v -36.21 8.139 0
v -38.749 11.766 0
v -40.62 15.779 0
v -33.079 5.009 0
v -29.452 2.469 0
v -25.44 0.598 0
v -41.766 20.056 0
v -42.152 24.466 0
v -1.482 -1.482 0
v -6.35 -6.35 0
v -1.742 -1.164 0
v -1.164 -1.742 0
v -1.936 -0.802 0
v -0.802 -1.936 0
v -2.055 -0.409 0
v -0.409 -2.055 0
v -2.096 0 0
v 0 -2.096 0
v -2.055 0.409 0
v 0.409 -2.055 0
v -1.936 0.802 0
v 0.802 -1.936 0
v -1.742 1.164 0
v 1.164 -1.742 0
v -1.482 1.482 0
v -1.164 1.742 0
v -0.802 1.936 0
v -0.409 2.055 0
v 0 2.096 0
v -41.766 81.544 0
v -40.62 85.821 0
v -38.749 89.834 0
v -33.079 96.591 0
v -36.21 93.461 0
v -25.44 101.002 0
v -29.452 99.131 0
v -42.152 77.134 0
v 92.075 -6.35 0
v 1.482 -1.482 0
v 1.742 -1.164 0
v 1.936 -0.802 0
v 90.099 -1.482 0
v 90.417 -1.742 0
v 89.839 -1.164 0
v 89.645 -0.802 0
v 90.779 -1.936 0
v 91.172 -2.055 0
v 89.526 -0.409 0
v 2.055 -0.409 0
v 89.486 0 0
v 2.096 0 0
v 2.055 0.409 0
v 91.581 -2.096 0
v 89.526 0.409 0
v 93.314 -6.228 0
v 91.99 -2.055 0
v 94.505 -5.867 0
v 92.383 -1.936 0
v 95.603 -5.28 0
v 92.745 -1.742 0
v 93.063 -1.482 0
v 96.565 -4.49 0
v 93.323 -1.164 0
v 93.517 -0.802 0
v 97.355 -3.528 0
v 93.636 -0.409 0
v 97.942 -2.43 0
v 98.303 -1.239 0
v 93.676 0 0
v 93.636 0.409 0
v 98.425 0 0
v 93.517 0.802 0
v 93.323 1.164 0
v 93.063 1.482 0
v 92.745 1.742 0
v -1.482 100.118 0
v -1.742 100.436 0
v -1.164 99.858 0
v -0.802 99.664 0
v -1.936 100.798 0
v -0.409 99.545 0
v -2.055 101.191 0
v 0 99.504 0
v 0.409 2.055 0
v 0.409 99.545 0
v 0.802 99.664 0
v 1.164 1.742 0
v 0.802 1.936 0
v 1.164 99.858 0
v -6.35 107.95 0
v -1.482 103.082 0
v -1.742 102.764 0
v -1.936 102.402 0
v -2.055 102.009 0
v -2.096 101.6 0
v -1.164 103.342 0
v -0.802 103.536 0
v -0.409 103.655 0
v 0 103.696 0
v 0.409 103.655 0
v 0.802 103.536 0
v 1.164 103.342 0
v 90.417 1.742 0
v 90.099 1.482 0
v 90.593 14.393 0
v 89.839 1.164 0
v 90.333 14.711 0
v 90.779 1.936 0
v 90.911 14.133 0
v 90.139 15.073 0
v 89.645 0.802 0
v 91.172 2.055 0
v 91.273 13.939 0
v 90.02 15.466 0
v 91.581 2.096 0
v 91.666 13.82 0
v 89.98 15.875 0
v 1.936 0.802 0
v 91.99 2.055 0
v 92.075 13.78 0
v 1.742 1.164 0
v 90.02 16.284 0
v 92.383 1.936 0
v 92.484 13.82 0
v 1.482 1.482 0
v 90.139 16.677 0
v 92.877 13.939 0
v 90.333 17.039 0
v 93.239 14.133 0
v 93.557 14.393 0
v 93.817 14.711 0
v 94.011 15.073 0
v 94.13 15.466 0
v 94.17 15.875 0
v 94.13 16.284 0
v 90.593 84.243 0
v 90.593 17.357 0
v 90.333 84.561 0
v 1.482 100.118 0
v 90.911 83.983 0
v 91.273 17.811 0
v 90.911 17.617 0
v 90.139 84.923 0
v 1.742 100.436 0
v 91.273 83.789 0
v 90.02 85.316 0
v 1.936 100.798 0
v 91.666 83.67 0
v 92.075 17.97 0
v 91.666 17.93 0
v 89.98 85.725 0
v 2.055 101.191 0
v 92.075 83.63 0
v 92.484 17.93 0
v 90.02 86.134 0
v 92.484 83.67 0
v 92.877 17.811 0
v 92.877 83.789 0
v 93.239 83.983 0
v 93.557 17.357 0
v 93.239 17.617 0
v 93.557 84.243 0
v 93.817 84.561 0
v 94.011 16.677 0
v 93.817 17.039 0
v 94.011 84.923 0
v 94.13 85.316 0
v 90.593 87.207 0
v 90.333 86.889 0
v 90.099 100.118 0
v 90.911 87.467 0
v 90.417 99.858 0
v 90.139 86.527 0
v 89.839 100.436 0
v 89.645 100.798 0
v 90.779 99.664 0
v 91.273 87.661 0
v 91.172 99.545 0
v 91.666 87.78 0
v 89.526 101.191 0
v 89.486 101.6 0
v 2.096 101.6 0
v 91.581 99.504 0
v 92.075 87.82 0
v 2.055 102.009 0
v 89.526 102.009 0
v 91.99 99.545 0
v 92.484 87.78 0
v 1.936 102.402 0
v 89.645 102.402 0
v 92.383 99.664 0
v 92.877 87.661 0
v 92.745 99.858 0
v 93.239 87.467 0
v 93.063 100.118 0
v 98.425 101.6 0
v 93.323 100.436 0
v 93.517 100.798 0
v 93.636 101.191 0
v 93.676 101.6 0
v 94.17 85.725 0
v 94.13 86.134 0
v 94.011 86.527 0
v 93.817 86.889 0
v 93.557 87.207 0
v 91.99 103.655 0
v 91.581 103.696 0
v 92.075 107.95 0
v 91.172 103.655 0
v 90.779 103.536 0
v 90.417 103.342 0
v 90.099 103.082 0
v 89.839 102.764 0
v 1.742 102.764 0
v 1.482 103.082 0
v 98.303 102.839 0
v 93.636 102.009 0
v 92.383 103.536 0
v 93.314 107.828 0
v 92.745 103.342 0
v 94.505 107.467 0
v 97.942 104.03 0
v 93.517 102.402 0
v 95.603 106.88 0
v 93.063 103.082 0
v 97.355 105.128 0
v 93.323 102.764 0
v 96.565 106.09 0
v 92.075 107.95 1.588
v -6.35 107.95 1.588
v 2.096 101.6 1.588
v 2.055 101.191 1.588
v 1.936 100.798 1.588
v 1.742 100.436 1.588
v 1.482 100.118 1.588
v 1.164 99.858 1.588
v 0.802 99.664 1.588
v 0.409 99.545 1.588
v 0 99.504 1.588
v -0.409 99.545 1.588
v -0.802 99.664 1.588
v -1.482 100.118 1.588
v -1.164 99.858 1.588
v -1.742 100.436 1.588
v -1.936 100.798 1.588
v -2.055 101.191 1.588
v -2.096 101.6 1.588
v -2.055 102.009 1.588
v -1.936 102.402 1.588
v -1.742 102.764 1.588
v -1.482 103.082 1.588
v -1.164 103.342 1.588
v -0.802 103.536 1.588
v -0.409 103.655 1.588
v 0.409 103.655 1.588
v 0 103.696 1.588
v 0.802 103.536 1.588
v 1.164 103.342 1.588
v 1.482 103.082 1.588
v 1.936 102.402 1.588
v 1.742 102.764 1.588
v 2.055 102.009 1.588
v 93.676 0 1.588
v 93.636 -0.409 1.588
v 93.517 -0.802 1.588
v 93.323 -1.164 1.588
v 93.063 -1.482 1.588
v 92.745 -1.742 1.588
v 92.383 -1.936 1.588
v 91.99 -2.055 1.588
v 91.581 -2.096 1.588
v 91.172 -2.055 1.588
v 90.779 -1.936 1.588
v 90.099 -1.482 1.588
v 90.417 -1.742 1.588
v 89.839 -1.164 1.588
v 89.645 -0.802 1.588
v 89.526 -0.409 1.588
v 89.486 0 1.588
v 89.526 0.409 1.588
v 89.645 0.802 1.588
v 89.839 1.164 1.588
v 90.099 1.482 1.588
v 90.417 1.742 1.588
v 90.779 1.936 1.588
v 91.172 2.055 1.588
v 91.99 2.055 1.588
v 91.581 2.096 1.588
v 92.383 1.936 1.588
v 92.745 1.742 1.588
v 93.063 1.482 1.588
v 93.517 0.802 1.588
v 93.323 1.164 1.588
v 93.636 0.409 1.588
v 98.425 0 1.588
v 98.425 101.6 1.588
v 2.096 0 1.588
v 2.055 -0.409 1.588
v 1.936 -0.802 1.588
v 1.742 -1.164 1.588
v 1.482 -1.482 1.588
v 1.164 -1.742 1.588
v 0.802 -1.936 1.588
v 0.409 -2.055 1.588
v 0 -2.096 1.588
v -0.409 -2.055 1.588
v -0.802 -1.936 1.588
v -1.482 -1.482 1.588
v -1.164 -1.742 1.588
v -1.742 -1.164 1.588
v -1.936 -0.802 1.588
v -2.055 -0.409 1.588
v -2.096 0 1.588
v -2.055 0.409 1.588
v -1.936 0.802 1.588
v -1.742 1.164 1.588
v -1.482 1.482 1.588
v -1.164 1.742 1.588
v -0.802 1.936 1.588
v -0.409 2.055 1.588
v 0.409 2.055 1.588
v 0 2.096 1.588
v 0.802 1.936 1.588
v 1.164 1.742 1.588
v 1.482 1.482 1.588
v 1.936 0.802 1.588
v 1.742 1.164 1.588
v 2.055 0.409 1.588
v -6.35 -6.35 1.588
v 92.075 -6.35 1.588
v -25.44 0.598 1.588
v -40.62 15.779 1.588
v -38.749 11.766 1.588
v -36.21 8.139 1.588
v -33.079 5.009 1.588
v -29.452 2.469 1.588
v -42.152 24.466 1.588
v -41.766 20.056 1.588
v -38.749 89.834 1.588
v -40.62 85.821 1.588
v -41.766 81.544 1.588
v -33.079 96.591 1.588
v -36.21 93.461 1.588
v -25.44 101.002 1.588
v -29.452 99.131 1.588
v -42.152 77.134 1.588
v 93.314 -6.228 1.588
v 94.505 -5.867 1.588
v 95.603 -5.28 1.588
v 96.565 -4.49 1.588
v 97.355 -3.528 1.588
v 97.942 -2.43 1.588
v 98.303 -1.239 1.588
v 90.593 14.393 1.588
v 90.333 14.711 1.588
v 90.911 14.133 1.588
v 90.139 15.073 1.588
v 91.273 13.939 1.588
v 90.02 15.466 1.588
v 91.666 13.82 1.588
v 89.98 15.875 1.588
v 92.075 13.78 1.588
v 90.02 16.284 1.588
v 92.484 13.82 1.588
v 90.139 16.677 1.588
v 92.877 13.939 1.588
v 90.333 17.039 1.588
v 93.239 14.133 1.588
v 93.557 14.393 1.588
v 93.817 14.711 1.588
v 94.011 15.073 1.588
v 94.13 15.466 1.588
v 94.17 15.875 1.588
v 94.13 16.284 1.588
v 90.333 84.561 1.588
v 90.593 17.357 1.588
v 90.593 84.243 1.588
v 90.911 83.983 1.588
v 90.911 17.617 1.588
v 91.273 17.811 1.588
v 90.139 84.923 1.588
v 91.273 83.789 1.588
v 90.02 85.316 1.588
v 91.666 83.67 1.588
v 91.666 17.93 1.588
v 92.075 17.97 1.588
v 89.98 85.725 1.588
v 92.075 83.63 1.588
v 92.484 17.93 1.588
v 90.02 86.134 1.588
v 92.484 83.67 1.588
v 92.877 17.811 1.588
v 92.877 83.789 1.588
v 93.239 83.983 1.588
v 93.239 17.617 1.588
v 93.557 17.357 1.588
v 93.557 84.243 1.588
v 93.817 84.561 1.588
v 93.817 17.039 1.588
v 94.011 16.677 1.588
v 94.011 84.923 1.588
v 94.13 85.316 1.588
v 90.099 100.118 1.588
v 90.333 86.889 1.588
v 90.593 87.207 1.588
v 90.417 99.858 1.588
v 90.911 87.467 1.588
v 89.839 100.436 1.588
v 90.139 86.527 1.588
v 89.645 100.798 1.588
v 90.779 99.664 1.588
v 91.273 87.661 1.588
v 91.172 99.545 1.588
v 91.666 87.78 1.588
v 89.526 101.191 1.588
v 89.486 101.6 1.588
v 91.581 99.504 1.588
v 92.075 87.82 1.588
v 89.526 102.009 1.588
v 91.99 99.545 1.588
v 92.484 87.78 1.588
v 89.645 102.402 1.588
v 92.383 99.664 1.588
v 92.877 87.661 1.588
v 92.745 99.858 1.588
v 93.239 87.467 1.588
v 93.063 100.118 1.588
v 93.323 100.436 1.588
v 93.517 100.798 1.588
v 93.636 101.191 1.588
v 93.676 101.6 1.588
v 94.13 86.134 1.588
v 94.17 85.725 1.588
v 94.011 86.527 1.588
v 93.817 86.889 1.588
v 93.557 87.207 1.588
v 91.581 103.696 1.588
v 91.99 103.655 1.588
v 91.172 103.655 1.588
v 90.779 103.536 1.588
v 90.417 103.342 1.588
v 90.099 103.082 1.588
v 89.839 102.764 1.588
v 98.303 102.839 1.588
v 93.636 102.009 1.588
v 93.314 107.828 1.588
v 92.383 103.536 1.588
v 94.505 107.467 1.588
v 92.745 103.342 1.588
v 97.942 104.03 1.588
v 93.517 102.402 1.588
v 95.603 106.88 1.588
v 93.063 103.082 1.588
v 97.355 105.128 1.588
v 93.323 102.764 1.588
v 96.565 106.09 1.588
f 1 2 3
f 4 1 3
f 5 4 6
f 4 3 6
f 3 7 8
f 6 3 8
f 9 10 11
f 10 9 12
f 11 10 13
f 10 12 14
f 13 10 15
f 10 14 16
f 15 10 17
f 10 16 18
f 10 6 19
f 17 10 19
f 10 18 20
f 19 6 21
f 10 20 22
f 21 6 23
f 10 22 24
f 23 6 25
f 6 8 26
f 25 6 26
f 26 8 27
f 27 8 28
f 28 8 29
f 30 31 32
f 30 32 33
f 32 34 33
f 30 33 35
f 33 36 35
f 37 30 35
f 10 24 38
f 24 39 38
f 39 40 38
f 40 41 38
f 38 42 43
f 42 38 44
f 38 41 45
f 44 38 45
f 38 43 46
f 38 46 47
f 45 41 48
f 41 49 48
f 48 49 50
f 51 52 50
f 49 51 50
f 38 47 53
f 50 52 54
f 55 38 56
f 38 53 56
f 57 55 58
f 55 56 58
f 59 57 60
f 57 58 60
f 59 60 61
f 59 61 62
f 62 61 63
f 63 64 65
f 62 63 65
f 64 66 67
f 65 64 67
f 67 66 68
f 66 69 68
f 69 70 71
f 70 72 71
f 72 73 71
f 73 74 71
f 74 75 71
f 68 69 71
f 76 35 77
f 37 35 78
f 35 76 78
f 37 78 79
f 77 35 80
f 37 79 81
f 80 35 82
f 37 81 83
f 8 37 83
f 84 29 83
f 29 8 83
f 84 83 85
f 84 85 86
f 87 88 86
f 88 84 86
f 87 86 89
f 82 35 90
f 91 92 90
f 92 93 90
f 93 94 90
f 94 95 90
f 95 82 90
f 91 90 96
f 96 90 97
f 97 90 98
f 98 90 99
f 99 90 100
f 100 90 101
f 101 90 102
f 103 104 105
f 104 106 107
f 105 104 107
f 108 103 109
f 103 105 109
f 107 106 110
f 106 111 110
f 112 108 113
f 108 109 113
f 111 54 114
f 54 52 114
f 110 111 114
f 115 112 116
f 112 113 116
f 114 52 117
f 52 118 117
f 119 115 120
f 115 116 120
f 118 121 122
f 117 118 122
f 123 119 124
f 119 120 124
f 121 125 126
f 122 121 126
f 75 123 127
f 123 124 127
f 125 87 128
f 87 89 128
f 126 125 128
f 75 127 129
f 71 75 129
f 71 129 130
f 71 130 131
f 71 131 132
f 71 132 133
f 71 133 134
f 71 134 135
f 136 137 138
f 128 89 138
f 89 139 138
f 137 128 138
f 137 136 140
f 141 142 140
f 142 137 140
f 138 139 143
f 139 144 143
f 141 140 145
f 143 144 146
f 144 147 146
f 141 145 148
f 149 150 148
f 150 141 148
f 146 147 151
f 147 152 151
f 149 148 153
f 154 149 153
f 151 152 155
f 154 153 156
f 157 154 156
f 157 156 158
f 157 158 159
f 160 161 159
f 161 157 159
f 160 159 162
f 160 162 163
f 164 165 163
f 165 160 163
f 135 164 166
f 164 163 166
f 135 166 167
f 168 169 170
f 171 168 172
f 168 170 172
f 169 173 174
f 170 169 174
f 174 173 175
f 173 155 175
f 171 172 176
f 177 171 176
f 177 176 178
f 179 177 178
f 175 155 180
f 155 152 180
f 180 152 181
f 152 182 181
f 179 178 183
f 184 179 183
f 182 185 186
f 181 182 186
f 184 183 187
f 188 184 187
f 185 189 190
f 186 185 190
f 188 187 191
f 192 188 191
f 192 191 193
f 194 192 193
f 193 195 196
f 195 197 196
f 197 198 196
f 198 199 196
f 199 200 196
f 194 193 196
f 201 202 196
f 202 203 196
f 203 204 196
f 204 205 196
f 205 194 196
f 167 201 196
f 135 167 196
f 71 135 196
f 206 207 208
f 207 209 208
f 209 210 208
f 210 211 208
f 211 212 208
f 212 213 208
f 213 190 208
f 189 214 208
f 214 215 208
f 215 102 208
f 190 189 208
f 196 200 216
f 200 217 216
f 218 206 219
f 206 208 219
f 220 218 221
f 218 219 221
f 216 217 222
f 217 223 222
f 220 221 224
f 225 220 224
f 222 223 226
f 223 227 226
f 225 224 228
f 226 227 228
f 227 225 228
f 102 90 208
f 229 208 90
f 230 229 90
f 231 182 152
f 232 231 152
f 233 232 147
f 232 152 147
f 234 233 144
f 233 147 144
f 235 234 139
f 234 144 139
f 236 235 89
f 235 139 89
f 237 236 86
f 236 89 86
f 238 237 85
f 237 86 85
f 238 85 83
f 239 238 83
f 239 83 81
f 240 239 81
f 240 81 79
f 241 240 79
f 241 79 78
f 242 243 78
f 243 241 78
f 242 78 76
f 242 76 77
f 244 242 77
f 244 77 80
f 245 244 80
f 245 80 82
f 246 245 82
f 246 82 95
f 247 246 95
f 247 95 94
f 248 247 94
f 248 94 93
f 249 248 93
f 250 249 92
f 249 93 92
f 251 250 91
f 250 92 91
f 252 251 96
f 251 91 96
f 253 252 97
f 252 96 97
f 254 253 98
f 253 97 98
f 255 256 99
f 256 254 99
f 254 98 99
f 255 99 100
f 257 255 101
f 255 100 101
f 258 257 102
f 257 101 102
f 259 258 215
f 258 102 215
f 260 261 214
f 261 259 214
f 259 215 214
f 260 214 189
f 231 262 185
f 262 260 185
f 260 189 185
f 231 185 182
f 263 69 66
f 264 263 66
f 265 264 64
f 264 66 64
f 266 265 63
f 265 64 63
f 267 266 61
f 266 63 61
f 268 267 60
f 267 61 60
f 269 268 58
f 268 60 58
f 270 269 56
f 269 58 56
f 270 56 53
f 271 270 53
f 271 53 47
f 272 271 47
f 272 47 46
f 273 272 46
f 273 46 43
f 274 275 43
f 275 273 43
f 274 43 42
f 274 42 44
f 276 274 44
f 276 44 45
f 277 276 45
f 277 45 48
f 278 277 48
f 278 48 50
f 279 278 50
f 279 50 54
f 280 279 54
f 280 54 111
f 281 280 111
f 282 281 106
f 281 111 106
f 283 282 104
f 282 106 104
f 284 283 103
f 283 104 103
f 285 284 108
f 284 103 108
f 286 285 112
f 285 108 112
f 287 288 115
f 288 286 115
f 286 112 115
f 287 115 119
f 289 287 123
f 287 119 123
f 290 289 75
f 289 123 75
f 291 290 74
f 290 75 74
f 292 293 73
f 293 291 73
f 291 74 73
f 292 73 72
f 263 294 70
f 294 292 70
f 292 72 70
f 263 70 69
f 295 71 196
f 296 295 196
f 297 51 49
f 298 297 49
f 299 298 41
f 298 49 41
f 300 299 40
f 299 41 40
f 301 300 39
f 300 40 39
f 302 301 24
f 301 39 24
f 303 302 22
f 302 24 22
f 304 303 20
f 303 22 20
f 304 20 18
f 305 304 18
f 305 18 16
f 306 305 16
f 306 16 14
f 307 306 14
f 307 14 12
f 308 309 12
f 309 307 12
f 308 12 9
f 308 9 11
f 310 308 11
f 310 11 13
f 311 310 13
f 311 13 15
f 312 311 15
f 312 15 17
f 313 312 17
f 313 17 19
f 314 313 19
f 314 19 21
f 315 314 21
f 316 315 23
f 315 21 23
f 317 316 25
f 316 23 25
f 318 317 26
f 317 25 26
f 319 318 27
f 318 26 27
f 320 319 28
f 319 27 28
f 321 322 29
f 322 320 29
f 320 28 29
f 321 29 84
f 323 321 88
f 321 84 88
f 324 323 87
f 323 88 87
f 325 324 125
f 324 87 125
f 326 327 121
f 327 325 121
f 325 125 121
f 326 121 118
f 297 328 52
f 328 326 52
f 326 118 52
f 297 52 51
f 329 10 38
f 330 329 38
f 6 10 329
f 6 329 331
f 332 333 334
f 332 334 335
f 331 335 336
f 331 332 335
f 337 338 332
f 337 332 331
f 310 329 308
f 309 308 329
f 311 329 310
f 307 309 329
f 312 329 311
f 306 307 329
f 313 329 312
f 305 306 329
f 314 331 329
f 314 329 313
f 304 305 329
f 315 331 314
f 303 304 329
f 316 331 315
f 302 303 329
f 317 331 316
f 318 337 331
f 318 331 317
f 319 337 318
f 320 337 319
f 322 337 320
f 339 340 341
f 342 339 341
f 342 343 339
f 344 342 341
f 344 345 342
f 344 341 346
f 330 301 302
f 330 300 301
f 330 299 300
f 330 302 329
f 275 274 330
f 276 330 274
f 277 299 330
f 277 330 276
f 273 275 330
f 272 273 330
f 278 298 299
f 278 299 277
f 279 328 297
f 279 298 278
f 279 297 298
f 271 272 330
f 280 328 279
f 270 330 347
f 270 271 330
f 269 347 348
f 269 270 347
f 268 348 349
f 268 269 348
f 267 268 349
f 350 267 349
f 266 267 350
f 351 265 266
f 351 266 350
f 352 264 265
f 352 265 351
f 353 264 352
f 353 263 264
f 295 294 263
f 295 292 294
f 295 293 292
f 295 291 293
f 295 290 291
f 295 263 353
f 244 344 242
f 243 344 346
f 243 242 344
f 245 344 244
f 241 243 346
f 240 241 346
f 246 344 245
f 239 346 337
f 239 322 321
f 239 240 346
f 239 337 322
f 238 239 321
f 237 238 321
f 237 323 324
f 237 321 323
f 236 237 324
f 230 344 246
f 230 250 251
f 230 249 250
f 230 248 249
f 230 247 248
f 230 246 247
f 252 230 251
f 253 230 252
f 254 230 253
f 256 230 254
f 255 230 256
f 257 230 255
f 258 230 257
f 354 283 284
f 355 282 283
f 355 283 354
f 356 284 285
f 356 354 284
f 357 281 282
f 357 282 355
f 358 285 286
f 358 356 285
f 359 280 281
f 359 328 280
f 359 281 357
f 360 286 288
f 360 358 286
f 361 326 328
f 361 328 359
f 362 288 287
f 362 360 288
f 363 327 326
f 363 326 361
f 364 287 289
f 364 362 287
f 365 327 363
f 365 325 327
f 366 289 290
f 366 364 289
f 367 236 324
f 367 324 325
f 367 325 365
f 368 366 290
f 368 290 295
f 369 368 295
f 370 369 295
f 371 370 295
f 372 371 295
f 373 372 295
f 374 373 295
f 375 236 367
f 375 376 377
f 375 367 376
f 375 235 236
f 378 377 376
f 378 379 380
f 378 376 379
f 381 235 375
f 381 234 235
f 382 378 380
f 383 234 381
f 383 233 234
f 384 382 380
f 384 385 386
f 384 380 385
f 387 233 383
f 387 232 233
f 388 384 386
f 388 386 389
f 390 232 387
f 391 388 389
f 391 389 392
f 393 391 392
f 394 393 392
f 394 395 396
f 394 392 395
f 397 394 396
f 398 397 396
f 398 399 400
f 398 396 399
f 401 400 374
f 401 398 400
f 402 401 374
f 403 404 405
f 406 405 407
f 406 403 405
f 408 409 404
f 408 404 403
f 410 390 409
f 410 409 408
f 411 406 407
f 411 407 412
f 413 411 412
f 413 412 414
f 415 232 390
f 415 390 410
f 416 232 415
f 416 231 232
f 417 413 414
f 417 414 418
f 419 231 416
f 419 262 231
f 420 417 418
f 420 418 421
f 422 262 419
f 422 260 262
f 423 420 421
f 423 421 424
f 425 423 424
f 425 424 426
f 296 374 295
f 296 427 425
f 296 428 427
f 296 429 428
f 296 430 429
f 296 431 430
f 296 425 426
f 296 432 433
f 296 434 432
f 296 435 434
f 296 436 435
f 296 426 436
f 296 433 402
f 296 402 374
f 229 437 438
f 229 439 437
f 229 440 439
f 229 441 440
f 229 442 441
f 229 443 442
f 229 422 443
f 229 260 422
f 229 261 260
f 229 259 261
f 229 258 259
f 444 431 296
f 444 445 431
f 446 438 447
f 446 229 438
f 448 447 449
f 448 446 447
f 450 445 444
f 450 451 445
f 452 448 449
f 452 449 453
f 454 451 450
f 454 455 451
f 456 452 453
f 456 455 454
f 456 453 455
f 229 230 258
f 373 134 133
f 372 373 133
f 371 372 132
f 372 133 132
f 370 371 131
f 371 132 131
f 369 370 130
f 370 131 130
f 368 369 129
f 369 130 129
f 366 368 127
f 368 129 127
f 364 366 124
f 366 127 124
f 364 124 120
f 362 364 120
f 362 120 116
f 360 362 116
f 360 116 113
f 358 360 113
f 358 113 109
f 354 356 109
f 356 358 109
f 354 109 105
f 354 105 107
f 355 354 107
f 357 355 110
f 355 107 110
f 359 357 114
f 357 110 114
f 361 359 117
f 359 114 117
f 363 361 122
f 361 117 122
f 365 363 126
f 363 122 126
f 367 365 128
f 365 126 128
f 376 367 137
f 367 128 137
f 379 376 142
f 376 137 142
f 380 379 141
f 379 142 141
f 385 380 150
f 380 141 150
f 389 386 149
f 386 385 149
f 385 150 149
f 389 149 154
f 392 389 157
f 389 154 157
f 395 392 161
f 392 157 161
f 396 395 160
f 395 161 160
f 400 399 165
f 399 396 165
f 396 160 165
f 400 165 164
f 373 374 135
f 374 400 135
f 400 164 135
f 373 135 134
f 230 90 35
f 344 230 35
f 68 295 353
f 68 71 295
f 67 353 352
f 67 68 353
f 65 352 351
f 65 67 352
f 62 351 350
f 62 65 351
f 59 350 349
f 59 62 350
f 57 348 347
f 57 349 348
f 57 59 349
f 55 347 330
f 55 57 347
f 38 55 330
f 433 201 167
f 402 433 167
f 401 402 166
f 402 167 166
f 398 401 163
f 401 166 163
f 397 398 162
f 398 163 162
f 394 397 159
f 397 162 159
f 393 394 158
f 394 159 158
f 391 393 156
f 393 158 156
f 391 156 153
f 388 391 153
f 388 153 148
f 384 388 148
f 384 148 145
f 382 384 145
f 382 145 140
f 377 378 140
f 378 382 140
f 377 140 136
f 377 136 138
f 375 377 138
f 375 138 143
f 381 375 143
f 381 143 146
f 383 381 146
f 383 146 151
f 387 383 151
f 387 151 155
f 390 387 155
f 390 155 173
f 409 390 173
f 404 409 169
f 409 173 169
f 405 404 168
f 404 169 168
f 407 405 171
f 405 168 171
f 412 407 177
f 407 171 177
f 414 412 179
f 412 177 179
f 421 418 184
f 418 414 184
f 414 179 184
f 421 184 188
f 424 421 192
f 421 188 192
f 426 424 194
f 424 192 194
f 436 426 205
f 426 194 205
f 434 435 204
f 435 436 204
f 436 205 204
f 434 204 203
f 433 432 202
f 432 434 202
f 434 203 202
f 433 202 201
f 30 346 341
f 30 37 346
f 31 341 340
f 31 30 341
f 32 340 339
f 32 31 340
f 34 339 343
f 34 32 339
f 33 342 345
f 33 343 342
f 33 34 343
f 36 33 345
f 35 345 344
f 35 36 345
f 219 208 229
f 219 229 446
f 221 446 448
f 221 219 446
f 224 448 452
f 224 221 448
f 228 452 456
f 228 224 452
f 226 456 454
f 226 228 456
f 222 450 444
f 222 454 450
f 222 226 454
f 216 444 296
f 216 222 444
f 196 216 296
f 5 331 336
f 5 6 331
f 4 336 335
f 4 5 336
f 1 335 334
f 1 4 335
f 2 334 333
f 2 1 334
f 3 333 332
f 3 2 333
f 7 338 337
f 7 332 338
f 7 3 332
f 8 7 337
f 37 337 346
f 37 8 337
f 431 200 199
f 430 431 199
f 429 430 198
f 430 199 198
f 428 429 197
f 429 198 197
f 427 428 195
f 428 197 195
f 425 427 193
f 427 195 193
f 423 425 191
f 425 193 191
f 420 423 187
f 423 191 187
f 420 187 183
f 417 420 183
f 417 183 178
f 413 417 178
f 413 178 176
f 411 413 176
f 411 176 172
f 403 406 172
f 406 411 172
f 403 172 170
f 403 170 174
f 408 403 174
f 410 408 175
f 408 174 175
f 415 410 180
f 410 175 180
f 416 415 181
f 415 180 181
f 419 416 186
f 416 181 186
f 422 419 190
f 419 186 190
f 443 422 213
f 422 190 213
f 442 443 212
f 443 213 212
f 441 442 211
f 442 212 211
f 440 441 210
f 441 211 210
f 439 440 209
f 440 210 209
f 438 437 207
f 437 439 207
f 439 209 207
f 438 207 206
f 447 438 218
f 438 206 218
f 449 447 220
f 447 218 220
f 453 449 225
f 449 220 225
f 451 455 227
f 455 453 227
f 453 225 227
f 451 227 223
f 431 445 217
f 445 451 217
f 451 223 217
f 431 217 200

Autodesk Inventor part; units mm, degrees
ref_plane "YZ Plane" through (0, 0, 0) normal (1, 0, 0) x (0, 1, 0)
ref_plane "XZ Plane" through (0, 0, 0) normal (0, 1, 0) x (-1, 0, 0)
ref_plane "XY Plane" through (0, 0, 0) normal (0, 0, 1) x (1, 0, 0)
sketch "Sketch1" plane through (0, 0, 0) normal (0, 0, 1) x (1, 0, 0)
  circle A0 centre (0, 0) radius 2.0955
  circle A1 centre (91.581, 0) radius 2.0955
  circle A2 centre (0, 101.6) radius 2.0955
  circle A3 centre (91.581, 101.6) radius 2.0955
  line L0 (-6.35, -6.35) -> (92.075, -6.35)
  line L1 (98.425, 0) -> (98.425, 101.6)
  line L2 (92.075, 107.95) -> (-6.35, 107.95)
  line L3 (-6.35, 107.95) -> (-25.4396, 101.002)
  line L4 (-6.35, -6.35) -> (-25.4396, 0.598)
  line L5 (-6.35, -6.35) -> (13.9647, -6.35) construction
  line L6 (-42.1523, 24.4662) -> (-42.1523, 77.1338)
  arc A4 (-25.4396, 101.002) -> (-42.1523, 77.1338) centre (-16.7523, 77.1338) ccw
  arc A5 (-42.1523, 24.4662) -> (-25.4396, 0.598) centre (-16.7523, 24.4662) ccw
  arc A6 (98.425, 101.6) -> (92.075, 107.95) centre (92.075, 101.6) ccw
  arc A7 (92.075, -6.35) -> (98.425, 0) centre (92.075, 0) ccw
  circle A8 centre (92.075, 85.725) radius 2.0955
  circle A9 centre (92.075, 15.875) radius 2.0955
  point P0 (98.425, -6.35)
  point P1 (98.425, 107.95)
  point P2 (-42.1523, 94.919)
  point P3 (-42.1523, 6.681)
  dimension "d0" = 4.191
  dimension "d1" = 4.191
  dimension "d2" = 4.191
  dimension "d3" = 4.191
  dimension "d4" = 104.775
  dimension "d5" = 114.3
  dimension "d6" = 38.1
  dimension "d7" = 160
  dimension "d8" = 38.1
  dimension "d9" = 160
  dimension "d10" = 25.4
  dimension "d11" = 6.35
  dimension "d12" = 4.191
  dimension "d13" = 4.191
extrude "Extrusion1" add sketch "Sketch1" along normal blind 1.5875
properties part number "ramp" material "Acetal Resin, White"
